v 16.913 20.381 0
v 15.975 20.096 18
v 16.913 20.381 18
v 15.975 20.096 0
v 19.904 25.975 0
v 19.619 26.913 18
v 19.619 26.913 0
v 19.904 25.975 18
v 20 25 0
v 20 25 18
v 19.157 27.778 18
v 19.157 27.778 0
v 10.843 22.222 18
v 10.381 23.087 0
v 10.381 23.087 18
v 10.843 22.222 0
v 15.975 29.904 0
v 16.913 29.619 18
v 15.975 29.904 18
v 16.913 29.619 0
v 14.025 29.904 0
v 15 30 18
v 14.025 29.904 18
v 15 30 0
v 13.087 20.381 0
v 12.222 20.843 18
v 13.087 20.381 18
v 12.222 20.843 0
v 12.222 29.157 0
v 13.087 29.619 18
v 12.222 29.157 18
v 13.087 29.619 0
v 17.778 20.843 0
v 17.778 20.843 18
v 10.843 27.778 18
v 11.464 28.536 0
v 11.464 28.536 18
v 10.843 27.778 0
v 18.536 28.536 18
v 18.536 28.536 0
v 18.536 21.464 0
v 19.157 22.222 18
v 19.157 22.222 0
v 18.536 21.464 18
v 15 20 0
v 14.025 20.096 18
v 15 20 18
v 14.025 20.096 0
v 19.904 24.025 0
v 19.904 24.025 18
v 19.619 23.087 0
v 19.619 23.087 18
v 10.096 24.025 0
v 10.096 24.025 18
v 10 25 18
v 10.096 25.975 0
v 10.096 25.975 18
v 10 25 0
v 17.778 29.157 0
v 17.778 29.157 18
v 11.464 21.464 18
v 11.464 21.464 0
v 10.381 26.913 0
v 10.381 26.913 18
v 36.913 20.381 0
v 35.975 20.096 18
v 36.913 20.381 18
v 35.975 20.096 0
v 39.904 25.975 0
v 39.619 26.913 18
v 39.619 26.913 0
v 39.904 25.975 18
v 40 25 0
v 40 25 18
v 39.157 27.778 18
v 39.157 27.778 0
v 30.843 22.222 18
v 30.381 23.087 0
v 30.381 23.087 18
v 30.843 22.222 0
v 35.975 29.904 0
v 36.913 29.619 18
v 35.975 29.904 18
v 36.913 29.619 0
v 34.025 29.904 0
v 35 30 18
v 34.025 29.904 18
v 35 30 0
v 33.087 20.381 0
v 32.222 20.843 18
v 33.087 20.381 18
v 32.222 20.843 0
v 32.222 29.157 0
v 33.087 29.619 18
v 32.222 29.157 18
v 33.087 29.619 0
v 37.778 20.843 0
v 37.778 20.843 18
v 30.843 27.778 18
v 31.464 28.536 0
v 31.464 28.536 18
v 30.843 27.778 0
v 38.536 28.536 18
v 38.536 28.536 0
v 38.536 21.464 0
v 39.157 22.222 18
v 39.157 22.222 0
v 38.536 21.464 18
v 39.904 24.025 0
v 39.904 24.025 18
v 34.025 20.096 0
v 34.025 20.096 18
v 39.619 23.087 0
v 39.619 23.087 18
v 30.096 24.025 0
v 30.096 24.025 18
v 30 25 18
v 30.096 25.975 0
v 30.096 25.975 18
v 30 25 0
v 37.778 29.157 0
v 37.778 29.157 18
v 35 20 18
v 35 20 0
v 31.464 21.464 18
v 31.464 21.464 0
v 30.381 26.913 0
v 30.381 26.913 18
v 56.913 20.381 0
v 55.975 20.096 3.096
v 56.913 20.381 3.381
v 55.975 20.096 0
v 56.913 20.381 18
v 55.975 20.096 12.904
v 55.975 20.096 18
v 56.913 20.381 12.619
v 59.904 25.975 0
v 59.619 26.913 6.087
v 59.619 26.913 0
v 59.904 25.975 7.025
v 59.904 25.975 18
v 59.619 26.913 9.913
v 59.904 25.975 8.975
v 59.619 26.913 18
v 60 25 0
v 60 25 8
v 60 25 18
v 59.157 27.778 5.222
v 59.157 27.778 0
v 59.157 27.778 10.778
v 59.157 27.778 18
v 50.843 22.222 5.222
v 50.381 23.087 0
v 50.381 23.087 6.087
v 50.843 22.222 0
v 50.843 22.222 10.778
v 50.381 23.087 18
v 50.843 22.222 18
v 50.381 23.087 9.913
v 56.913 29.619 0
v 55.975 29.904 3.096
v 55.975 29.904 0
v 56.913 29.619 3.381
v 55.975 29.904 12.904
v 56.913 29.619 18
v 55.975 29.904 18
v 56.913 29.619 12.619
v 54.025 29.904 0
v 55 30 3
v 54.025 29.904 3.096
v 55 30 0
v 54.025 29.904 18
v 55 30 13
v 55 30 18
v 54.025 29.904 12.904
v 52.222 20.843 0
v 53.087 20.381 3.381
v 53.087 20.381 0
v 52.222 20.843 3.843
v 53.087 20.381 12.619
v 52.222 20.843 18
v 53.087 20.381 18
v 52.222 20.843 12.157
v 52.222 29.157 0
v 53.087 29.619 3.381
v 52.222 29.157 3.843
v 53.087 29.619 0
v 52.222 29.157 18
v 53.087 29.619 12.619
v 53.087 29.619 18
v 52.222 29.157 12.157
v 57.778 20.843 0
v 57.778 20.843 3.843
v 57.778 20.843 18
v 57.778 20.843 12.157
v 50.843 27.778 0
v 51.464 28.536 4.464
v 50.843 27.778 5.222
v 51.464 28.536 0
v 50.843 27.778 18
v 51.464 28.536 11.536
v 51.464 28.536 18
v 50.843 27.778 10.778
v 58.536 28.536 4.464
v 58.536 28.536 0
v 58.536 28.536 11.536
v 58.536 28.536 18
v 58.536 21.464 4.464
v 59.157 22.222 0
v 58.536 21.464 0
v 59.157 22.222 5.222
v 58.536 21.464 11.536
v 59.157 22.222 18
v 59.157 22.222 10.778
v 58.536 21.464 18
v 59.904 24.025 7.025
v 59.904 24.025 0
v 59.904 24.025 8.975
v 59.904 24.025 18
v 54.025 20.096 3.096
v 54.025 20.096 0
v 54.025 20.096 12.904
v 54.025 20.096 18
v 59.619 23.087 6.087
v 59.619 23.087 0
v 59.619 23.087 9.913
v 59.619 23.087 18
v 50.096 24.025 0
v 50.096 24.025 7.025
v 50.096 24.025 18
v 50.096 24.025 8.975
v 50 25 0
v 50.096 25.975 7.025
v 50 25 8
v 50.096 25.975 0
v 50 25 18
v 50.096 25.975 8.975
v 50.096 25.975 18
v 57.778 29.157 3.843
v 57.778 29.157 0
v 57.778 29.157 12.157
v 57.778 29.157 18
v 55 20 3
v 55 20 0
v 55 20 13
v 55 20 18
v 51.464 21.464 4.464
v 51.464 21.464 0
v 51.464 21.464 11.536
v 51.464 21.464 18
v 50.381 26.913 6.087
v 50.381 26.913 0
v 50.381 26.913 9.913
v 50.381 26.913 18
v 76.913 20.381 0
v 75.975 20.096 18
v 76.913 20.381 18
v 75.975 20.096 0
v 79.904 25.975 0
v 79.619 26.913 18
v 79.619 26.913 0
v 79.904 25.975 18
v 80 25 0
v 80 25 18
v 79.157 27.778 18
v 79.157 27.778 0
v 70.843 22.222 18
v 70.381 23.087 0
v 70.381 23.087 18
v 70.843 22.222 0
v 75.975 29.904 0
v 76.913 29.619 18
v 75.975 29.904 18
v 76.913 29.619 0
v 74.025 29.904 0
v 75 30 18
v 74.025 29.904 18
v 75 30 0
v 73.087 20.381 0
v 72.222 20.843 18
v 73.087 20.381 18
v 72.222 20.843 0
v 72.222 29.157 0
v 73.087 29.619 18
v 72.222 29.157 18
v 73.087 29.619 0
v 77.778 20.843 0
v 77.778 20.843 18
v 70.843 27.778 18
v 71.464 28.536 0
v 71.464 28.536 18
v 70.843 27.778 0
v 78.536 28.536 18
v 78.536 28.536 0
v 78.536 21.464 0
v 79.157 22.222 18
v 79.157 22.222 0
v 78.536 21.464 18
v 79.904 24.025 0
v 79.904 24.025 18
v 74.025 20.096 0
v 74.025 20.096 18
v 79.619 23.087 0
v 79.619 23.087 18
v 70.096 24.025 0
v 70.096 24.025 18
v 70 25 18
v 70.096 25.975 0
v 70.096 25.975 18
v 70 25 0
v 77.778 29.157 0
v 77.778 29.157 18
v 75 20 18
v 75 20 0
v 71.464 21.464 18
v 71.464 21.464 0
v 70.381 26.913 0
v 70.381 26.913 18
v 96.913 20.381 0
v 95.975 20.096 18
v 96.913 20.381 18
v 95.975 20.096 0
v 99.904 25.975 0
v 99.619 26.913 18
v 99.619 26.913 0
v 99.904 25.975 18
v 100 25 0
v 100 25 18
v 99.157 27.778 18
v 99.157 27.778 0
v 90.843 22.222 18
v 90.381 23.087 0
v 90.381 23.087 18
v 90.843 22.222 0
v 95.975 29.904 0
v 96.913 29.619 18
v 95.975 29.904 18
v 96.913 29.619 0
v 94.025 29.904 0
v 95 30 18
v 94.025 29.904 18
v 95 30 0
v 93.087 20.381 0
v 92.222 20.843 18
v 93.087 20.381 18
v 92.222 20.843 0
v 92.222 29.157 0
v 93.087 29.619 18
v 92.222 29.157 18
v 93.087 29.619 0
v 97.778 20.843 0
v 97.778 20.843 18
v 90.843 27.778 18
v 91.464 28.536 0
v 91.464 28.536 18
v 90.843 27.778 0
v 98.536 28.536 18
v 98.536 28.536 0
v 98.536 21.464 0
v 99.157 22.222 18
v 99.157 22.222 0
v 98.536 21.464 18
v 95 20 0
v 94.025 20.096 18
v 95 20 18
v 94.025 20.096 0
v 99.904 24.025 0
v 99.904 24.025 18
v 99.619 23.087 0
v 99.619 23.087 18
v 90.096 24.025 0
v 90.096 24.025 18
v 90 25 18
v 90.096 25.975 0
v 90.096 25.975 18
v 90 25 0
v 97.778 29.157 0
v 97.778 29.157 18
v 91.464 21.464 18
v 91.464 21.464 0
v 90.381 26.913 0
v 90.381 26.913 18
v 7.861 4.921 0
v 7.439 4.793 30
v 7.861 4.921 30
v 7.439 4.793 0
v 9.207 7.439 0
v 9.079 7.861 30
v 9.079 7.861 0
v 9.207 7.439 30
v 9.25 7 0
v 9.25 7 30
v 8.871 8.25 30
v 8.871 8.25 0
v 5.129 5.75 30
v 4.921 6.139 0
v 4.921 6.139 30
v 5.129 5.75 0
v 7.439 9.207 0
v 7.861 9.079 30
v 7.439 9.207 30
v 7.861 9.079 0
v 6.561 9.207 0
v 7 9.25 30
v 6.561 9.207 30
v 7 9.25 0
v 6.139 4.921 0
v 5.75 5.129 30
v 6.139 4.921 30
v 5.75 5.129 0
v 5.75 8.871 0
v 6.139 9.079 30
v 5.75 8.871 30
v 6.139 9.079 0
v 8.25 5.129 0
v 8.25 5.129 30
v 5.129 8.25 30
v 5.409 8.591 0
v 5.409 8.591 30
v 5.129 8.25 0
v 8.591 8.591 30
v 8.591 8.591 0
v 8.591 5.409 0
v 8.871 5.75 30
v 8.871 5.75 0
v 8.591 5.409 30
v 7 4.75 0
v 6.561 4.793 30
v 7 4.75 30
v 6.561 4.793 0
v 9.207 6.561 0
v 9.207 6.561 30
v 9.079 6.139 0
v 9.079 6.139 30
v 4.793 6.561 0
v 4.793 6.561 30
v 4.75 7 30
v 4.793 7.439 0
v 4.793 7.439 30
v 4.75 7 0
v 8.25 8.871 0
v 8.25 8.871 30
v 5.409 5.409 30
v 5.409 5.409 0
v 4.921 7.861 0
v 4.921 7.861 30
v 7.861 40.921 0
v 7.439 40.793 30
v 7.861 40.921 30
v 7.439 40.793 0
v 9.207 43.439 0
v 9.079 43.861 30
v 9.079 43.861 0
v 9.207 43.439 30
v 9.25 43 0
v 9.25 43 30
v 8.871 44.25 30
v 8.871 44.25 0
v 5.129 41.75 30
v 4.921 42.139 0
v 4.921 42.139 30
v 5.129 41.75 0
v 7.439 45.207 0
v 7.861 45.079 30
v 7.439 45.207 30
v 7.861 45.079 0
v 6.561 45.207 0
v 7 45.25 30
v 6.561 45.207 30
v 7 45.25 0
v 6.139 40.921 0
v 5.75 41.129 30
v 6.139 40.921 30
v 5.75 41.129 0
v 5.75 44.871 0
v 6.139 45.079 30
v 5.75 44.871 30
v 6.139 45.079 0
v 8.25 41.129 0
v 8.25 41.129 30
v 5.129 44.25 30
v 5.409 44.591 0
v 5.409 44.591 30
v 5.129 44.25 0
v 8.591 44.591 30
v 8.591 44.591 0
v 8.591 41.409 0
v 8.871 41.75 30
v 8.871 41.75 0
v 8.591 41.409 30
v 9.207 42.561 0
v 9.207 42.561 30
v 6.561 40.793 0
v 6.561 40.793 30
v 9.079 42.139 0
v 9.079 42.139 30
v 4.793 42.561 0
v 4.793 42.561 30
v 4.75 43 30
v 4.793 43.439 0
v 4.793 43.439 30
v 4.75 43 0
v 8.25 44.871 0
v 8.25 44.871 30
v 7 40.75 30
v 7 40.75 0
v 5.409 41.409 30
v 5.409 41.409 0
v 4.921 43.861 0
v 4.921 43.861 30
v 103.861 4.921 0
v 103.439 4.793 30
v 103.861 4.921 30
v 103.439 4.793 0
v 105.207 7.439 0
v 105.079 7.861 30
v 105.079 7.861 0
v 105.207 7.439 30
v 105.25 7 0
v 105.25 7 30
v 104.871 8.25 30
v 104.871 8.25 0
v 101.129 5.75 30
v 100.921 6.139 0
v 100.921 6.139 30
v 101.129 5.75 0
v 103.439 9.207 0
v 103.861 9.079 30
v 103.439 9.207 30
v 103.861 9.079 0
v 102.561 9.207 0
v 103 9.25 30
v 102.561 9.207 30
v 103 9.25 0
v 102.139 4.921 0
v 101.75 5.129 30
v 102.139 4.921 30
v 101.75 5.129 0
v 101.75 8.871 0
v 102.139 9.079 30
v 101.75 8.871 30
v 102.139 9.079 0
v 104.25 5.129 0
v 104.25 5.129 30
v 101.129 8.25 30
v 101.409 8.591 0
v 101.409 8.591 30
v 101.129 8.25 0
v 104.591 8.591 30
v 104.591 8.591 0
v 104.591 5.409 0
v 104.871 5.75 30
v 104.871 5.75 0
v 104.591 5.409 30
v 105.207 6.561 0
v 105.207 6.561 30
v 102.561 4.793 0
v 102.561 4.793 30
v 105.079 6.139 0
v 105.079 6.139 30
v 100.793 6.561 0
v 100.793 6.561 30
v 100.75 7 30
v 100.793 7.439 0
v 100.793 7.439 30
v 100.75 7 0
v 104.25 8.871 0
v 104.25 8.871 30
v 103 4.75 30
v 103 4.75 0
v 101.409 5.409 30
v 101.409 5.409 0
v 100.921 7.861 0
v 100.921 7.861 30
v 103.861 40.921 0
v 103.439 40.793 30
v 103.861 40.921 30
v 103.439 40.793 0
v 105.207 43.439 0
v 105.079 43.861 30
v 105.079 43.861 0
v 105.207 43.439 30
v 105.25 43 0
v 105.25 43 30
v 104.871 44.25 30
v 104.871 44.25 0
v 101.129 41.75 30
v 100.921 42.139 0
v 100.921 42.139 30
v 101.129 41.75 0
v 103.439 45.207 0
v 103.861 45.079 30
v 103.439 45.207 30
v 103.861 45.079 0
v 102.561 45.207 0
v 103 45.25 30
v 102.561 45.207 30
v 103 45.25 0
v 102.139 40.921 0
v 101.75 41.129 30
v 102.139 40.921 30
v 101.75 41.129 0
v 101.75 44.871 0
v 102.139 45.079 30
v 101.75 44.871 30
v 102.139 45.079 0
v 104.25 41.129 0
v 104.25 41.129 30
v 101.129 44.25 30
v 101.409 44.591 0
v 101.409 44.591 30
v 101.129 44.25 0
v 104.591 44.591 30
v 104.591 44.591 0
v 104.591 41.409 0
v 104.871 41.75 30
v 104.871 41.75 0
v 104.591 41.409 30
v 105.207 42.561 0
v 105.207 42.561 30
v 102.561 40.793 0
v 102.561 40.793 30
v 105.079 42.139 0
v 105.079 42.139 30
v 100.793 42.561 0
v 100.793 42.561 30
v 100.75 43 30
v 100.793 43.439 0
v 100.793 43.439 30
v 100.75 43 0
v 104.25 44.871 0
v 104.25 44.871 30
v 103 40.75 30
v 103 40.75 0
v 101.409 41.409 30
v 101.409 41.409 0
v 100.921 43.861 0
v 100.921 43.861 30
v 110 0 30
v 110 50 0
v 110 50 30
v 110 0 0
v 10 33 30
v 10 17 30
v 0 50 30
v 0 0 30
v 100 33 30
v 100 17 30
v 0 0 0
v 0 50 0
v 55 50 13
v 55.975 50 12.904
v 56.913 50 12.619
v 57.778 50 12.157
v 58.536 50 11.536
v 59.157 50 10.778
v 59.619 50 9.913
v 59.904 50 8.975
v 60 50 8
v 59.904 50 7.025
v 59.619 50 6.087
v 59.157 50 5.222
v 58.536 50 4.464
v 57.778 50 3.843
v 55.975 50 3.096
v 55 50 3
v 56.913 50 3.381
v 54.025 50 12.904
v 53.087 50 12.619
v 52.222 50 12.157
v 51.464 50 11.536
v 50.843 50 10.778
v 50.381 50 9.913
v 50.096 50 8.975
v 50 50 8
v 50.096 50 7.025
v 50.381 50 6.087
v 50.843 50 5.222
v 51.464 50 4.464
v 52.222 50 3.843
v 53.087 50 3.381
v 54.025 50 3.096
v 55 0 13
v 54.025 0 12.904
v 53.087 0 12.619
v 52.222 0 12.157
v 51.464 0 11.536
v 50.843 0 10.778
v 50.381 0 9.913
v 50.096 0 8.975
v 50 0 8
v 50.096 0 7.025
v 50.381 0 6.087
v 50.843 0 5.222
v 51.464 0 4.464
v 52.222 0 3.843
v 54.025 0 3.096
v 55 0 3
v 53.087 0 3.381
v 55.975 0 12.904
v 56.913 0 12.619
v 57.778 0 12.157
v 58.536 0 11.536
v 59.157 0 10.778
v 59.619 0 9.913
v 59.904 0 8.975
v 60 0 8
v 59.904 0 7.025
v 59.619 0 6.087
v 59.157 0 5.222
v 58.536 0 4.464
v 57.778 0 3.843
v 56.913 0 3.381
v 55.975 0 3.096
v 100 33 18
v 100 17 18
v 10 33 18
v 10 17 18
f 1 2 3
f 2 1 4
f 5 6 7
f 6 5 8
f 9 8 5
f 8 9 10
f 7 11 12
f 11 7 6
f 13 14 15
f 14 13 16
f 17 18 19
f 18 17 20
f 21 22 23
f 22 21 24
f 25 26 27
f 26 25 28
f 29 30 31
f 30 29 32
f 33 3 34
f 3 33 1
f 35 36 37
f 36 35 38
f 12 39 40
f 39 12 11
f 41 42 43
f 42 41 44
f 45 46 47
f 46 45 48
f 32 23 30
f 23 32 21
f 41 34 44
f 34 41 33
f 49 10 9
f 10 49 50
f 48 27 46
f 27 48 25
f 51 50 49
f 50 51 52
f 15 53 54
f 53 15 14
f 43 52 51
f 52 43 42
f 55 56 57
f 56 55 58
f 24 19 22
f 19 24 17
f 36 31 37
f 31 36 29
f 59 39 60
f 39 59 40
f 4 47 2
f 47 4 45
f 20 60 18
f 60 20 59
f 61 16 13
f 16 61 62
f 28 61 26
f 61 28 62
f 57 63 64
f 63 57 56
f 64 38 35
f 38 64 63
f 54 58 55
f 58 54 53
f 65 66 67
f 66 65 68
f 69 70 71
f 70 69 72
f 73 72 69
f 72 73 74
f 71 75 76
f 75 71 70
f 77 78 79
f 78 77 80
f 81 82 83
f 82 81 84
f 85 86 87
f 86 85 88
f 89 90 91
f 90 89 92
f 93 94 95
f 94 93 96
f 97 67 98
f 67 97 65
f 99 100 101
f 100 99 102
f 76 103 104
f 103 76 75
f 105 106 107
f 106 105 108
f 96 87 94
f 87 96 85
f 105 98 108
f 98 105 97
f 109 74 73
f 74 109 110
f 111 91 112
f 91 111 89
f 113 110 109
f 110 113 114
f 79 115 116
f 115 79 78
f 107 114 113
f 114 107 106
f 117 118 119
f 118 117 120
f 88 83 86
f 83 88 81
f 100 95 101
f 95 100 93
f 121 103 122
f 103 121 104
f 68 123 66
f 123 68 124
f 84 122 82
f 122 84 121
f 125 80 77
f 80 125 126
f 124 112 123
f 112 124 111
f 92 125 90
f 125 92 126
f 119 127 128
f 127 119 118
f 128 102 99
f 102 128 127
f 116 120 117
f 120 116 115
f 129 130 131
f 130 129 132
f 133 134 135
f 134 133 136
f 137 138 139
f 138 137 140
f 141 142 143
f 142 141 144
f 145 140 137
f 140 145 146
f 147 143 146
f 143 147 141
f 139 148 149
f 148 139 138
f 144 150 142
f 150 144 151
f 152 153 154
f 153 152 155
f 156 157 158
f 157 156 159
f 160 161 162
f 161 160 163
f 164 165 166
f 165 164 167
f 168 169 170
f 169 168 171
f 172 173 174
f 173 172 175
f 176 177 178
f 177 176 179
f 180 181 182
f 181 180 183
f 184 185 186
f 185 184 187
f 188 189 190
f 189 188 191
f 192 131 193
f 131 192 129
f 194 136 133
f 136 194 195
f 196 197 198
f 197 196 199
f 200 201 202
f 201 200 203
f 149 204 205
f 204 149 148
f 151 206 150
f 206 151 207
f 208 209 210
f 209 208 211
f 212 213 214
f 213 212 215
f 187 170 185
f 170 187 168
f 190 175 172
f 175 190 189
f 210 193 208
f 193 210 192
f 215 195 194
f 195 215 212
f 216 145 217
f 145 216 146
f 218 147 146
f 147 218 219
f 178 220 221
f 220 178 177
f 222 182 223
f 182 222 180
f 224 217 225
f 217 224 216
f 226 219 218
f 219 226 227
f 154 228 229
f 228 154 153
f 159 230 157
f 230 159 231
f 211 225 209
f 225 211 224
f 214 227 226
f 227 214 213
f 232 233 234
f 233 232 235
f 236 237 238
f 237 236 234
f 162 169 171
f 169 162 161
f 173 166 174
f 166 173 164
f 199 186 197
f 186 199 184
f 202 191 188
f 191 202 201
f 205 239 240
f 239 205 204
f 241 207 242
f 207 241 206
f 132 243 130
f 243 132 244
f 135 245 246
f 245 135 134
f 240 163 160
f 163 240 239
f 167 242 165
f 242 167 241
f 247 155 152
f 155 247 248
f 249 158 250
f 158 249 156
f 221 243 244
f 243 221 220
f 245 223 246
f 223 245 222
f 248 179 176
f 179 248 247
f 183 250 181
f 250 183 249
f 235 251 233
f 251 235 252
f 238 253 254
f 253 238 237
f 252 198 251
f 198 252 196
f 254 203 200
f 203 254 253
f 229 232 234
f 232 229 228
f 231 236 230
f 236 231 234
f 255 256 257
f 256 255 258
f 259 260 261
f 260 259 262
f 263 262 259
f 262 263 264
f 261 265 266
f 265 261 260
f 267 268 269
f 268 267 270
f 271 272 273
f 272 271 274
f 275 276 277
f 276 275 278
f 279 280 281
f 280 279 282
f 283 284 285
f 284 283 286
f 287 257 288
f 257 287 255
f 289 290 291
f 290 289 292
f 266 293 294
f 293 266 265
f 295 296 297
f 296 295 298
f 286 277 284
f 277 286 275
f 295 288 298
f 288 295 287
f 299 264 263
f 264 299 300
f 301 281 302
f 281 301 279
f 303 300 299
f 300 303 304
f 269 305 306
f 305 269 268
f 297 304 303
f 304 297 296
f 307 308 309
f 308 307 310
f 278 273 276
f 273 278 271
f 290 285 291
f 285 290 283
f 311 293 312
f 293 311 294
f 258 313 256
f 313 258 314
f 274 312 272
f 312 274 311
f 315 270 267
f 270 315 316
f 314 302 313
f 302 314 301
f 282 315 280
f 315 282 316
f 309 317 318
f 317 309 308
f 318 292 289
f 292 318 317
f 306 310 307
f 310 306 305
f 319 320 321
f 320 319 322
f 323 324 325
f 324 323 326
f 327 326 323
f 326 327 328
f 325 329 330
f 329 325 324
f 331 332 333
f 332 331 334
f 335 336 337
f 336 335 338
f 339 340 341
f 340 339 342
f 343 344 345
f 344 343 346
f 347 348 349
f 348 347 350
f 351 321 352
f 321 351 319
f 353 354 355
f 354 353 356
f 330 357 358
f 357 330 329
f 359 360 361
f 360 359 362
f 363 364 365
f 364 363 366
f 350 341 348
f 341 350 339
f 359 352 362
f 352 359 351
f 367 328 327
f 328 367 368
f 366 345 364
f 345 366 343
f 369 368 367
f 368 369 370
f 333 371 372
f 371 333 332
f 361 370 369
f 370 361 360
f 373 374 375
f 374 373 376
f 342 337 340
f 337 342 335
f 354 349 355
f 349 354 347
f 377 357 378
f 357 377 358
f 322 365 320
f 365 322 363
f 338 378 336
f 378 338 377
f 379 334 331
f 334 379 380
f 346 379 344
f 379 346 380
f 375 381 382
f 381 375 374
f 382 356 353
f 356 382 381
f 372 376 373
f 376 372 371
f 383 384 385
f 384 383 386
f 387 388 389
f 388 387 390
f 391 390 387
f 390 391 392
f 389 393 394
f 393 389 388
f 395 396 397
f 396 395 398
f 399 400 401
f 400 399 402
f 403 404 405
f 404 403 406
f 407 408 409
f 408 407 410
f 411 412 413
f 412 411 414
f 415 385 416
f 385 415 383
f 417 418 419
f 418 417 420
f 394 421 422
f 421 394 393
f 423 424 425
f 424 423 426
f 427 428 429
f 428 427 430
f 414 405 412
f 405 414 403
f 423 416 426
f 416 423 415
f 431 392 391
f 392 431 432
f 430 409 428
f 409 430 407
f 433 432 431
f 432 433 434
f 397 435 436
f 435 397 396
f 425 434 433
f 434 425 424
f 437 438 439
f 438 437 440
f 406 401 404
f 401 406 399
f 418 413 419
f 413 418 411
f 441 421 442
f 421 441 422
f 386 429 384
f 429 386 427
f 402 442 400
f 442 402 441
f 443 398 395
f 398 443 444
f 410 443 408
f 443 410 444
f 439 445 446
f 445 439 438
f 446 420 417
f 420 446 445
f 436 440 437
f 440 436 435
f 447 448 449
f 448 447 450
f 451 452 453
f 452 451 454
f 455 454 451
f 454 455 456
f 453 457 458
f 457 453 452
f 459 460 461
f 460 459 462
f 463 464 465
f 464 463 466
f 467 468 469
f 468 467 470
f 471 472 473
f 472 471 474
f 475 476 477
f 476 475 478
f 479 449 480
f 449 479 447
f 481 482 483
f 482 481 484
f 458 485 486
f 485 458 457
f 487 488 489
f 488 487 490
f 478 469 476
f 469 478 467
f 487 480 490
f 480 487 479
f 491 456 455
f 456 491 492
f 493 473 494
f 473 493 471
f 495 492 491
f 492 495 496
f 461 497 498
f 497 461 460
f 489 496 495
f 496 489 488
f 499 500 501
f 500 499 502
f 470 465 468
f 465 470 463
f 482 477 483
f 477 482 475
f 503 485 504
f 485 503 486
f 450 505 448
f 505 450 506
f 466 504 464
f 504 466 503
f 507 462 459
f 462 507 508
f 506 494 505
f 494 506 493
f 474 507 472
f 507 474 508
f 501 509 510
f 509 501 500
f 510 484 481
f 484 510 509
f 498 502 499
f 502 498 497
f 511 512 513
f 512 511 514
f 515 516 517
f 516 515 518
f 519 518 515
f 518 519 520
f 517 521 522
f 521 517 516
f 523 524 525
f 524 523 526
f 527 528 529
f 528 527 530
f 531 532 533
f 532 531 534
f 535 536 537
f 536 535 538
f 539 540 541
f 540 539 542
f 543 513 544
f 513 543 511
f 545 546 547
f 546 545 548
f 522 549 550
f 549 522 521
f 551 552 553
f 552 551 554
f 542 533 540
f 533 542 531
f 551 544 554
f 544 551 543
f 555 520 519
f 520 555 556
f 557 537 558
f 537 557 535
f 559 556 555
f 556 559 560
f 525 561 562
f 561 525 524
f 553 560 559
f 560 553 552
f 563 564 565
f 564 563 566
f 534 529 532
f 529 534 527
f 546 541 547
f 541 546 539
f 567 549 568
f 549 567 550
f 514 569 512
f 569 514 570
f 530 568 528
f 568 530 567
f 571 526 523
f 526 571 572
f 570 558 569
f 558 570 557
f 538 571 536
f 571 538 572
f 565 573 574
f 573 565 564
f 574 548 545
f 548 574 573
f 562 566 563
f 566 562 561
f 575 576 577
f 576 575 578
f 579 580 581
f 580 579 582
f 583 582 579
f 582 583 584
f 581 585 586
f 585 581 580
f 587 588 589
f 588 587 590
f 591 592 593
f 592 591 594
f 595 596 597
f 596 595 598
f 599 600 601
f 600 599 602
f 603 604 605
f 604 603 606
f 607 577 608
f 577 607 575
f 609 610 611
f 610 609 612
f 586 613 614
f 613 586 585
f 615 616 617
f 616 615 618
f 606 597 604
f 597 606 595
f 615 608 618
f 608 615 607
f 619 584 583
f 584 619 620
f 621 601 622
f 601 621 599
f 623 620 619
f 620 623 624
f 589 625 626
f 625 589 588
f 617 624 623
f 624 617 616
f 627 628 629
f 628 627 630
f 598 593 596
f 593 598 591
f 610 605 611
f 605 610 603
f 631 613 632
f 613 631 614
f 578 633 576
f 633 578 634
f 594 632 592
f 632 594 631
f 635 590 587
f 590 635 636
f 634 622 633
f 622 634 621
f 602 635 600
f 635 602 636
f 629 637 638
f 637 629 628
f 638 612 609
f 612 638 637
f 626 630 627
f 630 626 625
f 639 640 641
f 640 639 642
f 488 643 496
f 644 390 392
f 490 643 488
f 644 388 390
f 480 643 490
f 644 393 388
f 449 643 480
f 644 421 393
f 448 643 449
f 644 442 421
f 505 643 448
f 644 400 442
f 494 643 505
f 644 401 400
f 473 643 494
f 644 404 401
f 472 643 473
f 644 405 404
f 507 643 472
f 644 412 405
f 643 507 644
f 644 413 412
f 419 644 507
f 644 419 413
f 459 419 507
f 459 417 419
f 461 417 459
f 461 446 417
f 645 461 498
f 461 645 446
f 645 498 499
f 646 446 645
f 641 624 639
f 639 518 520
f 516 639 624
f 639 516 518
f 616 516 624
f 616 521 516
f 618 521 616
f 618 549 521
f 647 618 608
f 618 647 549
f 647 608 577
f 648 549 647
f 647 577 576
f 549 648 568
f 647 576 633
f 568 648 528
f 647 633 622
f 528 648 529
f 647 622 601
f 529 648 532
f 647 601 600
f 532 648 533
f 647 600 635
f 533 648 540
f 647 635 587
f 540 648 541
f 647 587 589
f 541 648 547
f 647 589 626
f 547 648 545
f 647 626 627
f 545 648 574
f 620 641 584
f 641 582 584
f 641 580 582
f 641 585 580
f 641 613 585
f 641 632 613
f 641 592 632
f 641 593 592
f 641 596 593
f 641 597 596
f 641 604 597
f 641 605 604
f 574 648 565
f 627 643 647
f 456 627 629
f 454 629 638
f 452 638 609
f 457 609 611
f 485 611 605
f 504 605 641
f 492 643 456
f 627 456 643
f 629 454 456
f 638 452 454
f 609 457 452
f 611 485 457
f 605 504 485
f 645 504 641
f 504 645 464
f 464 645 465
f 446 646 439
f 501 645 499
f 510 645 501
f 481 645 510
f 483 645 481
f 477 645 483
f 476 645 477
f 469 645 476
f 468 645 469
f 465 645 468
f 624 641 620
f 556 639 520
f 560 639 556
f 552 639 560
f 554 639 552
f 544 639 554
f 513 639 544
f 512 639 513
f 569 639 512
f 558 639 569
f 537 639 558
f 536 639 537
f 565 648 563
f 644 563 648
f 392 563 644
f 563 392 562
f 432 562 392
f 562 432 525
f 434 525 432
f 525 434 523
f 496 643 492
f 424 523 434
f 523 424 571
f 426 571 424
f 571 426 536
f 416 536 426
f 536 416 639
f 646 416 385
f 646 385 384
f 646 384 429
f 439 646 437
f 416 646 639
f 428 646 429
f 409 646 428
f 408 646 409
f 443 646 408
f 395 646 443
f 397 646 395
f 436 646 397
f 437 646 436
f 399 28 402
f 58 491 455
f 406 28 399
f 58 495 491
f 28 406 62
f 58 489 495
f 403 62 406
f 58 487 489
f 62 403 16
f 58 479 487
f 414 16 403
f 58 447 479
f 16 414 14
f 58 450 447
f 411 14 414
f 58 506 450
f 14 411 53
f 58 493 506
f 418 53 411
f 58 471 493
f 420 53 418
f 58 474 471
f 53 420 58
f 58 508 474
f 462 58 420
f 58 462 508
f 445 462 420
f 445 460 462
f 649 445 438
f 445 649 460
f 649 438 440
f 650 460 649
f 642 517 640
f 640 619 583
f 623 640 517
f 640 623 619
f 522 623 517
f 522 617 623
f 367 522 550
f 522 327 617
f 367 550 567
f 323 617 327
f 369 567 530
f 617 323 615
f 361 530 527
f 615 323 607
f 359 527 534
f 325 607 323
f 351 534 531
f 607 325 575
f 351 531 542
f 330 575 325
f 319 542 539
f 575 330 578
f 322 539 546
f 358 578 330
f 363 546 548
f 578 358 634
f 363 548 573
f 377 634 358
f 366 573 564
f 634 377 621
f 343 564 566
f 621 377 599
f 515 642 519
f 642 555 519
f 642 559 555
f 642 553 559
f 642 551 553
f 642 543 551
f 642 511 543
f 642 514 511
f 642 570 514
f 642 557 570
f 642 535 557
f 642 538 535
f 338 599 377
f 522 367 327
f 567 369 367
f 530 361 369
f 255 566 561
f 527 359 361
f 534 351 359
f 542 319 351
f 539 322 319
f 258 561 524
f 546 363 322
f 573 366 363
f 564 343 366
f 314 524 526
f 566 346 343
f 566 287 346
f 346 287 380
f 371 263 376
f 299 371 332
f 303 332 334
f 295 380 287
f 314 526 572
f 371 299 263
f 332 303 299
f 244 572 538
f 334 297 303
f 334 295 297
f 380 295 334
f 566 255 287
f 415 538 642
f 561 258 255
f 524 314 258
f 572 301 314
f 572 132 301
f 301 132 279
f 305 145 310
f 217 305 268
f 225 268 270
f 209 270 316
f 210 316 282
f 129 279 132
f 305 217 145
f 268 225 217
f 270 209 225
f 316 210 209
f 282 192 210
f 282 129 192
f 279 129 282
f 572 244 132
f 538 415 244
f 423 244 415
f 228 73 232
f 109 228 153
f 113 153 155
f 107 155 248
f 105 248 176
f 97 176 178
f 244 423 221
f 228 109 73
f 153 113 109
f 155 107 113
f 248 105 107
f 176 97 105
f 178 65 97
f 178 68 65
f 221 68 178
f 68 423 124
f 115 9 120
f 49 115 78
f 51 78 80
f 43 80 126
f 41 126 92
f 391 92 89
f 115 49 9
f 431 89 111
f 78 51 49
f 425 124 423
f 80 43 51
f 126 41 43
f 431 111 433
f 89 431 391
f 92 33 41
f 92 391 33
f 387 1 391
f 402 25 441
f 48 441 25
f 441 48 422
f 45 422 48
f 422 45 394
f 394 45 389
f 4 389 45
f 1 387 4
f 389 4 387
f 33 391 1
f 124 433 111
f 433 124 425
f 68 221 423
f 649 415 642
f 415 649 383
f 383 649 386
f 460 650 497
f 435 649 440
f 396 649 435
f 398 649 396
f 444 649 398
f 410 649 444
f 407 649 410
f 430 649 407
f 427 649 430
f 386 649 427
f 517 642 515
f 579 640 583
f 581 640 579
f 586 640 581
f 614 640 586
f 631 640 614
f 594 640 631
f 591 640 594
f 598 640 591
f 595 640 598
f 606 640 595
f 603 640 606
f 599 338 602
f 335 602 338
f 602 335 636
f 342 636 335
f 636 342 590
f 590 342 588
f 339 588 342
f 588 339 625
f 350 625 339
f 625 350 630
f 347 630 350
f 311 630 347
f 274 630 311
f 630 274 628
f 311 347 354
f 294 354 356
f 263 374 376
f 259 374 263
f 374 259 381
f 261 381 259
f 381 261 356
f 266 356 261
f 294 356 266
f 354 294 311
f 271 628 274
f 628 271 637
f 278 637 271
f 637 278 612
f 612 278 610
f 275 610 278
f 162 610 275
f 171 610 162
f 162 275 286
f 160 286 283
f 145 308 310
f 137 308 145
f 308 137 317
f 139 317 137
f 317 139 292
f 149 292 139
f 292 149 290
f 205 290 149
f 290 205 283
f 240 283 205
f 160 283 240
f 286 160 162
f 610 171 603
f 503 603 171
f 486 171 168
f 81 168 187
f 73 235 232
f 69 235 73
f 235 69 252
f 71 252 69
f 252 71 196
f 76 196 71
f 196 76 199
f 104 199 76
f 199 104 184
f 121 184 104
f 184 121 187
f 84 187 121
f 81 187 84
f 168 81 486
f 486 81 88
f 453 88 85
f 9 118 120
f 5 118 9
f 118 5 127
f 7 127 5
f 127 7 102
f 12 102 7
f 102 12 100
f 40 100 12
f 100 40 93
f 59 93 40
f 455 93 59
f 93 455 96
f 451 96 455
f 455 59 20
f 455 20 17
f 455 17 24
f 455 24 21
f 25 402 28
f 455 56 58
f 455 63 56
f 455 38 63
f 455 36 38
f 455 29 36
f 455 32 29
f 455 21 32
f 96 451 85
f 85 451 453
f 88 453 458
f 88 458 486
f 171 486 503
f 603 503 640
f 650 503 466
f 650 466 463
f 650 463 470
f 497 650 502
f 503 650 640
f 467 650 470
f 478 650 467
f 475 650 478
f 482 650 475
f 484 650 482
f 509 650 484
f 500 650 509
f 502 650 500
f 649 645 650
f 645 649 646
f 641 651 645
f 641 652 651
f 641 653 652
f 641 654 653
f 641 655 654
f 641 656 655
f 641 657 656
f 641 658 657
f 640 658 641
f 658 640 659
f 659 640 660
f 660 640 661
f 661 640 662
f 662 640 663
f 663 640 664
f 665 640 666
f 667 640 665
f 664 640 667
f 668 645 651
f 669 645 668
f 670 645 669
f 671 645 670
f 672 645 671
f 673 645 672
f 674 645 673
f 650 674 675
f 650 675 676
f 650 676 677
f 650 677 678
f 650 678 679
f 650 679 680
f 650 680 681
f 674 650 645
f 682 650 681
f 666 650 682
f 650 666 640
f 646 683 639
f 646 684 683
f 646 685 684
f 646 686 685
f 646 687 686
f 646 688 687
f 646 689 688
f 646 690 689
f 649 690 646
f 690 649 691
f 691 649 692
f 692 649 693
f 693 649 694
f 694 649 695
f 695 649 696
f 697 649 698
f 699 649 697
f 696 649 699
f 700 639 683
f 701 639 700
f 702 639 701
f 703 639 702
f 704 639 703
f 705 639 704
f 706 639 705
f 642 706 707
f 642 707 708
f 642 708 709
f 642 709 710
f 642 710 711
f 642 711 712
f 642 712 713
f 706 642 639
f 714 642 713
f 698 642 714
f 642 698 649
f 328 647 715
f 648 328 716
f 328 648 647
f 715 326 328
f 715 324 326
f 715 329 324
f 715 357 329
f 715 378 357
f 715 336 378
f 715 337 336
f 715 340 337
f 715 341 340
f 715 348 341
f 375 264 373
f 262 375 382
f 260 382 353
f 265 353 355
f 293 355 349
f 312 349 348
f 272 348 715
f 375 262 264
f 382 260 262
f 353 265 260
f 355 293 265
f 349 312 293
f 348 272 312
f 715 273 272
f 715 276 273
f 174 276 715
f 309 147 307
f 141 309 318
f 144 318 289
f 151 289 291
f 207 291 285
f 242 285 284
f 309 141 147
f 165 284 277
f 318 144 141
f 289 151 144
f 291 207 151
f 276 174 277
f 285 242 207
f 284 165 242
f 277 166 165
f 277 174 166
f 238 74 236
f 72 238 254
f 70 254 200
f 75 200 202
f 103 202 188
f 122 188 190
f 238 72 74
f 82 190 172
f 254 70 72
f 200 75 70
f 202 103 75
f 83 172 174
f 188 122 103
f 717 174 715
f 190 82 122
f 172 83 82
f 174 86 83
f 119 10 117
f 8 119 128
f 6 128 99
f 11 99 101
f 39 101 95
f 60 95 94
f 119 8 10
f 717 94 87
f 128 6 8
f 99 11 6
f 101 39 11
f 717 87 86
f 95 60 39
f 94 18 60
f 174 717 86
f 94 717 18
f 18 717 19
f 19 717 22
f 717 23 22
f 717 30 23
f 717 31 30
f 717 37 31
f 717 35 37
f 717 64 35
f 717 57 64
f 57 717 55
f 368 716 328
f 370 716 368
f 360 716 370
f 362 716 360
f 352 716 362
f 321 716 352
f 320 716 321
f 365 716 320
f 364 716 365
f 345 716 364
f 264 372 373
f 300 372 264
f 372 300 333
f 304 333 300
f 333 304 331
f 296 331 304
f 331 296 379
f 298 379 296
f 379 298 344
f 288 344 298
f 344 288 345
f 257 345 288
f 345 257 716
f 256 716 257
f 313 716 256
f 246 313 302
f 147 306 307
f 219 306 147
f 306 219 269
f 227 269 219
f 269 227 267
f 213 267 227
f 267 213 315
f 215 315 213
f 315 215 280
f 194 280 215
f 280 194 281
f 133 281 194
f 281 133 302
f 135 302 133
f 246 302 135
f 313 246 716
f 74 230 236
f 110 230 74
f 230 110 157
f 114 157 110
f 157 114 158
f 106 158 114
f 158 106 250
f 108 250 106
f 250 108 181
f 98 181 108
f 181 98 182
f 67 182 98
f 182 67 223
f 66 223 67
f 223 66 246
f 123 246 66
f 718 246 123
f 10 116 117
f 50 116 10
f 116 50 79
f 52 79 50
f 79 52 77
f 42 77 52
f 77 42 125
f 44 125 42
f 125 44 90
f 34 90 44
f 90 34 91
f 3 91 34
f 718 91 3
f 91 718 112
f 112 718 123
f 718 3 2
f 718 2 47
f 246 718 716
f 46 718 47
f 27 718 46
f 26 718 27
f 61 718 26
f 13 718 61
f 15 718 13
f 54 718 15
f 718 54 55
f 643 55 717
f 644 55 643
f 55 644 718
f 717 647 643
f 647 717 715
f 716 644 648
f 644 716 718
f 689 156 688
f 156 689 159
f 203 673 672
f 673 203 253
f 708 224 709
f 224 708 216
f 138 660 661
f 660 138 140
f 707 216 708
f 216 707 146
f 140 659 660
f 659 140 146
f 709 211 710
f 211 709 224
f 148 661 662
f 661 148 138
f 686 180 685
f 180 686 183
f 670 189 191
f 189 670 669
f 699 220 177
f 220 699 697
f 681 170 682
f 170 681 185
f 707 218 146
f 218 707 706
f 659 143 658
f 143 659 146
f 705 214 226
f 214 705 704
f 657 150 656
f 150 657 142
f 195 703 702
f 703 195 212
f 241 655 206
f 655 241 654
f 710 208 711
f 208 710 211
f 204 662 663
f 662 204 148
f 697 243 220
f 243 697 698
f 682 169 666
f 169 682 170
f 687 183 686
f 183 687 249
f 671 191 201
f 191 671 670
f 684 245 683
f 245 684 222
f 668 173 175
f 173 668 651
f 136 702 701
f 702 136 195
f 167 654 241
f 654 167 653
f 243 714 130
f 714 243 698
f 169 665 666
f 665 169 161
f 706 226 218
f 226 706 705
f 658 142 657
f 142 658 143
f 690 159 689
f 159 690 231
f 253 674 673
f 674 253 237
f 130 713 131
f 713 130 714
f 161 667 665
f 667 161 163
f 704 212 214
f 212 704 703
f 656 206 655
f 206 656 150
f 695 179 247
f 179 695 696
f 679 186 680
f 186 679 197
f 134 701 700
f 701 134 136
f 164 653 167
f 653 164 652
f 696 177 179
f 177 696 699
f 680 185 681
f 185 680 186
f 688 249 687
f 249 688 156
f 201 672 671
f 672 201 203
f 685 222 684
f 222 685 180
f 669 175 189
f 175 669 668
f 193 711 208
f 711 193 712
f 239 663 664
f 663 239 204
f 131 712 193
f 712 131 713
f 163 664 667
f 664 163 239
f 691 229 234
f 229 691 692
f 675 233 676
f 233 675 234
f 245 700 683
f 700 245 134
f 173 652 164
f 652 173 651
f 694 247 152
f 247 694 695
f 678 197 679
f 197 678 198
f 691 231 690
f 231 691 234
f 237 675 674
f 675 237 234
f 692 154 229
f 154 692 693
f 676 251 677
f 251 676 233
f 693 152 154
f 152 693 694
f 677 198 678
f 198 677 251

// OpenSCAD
$fn = 32;

// ----------------------------------------------------------------------
// Manifold block: side_outlet manifold
// ----------------------------------------------------------------------

// --- parameters (mm) ---
block_l = 110;            // block length, X
block_w = 50;             // block width, Y
block_h = 30;             // block height, Z
port_d = 10;              // port bore diameter
port_pitch = 20;          // port pitch along X
gallery_d = 16;           // top gallery width, Y
gallery_depth = 12;       // gallery pocket depth
wall_p = 10;              // gallery end wall thickness, X
mnt_d = 4.5;              // mounting hole diameter
mnt_in = 7;               // mounting hole inset from the edges
out_d = 10;               // outlet bore diameter
out_z = 8;                // outlet axis height

n_ports = 5;  // ports in the row
port_x0 = (block_l - (n_ports - 1) * port_pitch) / 2;  // first port X

difference() {
  cube([block_l, block_w, block_h]);
  for (i = [0 : n_ports - 1])
    translate([port_x0 + i * port_pitch, block_w / 2, -1])
      cylinder(h = block_h + 2, d = port_d);
  translate([wall_p, block_w / 2 - gallery_d / 2, block_h - gallery_depth])
    cube([block_l - 2 * wall_p, gallery_d, gallery_depth + 1]);
  for (cx = [mnt_in, block_l - mnt_in])
    for (cy = [mnt_in, block_w - mnt_in])
      translate([cx, cy, -1]) cylinder(h = block_h + 2, d = mnt_d);
  translate([block_l / 2, -1, out_z]) rotate([-90, 0, 0])
    cylinder(h = block_w + 2, d = out_d);
}
